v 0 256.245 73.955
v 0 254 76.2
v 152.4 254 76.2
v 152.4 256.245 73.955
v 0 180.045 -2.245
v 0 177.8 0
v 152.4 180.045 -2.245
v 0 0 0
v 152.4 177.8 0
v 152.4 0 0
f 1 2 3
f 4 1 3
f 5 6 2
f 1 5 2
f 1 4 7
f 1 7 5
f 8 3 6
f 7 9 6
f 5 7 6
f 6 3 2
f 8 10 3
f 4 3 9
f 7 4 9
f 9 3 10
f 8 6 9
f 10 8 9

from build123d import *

# Parameters (mm, degrees)
F0_W     = 152.4
F0_H     = 254
F1_DEPTH = 76.2
F3_DEPTH = 152.4
F5_DEPTH = 254.001
F7_DEPTH = 152.401
F9_DEPTH = 3.175


with BuildPart() as f1:
    # F0 (on Top) → F1 (new body)
    with BuildSketch(Plane.XY):
        with Locations((76.2, 127)):
            Rectangle(F0_W, F0_H)
    extrude(amount=F1_DEPTH)

    # F2 (on face) → F3 (cut, through all)
    with BuildSketch(Plane.YZ.offset(152.4)):
        Polygon((0, 76.2), (0, 0), (254, 76.2), align=None)
    extrude(amount=-F3_DEPTH, mode=Mode.SUBTRACT)

    # F4 (on face) → F5 (cut, through all)
    with BuildSketch(Plane(origin=(0, 254, 0), x_dir=(-1, 0, 0), z_dir=(0, 1, 0))):
        Polygon((0, 76.2), (-152.4, 76.2), (0, 0), align=None)
    extrude(amount=-F5_DEPTH, mode=Mode.SUBTRACT)

    # F6 (on face) → F7 (cut, through all)
    with BuildSketch(Plane.YZ.offset(152.4)):
        Polygon((254, 0), (254, 76.2), (177.8, 0), align=None)
    extrude(amount=-F7_DEPTH, mode=Mode.SUBTRACT)

    # F8 (on face) → F9 (join)
    with BuildSketch(Plane(origin=(0, 88.9, -88.9), x_dir=(-1, 0, 0), z_dir=(0, 0.7071067812, -0.7071067812))):
        Polygon((-152.4, 233.4866591478), (0, 125.723585695), (0, 233.4866591478), align=None)
        Polygon((-152.4, 125.7235856949), (0, 125.7235856949), (-152.4, 233.4866591478), align=None)
    extrude(amount=F9_DEPTH)


solid = f1.part
